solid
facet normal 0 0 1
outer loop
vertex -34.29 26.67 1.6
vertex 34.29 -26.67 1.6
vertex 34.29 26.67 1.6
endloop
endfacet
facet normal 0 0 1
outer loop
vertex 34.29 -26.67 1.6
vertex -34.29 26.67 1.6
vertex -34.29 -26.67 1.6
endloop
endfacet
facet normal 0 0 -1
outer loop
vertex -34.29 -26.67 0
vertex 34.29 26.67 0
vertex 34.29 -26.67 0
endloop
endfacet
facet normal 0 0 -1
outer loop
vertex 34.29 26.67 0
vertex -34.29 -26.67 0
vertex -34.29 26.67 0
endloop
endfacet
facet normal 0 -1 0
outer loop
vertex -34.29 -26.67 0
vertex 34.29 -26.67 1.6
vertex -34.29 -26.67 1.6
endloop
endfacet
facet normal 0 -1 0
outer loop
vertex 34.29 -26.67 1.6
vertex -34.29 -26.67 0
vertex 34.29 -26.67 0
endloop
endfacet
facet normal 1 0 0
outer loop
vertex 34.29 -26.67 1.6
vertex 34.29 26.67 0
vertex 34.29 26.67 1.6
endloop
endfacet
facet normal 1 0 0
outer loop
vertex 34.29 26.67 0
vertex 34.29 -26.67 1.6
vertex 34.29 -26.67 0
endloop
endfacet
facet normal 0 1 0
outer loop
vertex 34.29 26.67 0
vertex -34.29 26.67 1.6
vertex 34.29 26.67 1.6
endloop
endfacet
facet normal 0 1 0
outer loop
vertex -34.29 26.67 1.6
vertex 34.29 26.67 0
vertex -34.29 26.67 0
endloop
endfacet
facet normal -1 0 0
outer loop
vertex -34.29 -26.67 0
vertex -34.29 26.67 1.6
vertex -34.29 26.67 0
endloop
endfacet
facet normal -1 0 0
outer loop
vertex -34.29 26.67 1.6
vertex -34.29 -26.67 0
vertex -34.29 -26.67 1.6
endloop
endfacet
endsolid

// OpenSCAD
$fn=64;

board_len = 68.58;
board_wid = 53.34;
board_thk = 1.6;

module dev_board(l=board_len, w=board_wid, t=board_thk){
    translate([0,0,t/2])
        cube([l,w,t], center=true);
}

dev_board();
